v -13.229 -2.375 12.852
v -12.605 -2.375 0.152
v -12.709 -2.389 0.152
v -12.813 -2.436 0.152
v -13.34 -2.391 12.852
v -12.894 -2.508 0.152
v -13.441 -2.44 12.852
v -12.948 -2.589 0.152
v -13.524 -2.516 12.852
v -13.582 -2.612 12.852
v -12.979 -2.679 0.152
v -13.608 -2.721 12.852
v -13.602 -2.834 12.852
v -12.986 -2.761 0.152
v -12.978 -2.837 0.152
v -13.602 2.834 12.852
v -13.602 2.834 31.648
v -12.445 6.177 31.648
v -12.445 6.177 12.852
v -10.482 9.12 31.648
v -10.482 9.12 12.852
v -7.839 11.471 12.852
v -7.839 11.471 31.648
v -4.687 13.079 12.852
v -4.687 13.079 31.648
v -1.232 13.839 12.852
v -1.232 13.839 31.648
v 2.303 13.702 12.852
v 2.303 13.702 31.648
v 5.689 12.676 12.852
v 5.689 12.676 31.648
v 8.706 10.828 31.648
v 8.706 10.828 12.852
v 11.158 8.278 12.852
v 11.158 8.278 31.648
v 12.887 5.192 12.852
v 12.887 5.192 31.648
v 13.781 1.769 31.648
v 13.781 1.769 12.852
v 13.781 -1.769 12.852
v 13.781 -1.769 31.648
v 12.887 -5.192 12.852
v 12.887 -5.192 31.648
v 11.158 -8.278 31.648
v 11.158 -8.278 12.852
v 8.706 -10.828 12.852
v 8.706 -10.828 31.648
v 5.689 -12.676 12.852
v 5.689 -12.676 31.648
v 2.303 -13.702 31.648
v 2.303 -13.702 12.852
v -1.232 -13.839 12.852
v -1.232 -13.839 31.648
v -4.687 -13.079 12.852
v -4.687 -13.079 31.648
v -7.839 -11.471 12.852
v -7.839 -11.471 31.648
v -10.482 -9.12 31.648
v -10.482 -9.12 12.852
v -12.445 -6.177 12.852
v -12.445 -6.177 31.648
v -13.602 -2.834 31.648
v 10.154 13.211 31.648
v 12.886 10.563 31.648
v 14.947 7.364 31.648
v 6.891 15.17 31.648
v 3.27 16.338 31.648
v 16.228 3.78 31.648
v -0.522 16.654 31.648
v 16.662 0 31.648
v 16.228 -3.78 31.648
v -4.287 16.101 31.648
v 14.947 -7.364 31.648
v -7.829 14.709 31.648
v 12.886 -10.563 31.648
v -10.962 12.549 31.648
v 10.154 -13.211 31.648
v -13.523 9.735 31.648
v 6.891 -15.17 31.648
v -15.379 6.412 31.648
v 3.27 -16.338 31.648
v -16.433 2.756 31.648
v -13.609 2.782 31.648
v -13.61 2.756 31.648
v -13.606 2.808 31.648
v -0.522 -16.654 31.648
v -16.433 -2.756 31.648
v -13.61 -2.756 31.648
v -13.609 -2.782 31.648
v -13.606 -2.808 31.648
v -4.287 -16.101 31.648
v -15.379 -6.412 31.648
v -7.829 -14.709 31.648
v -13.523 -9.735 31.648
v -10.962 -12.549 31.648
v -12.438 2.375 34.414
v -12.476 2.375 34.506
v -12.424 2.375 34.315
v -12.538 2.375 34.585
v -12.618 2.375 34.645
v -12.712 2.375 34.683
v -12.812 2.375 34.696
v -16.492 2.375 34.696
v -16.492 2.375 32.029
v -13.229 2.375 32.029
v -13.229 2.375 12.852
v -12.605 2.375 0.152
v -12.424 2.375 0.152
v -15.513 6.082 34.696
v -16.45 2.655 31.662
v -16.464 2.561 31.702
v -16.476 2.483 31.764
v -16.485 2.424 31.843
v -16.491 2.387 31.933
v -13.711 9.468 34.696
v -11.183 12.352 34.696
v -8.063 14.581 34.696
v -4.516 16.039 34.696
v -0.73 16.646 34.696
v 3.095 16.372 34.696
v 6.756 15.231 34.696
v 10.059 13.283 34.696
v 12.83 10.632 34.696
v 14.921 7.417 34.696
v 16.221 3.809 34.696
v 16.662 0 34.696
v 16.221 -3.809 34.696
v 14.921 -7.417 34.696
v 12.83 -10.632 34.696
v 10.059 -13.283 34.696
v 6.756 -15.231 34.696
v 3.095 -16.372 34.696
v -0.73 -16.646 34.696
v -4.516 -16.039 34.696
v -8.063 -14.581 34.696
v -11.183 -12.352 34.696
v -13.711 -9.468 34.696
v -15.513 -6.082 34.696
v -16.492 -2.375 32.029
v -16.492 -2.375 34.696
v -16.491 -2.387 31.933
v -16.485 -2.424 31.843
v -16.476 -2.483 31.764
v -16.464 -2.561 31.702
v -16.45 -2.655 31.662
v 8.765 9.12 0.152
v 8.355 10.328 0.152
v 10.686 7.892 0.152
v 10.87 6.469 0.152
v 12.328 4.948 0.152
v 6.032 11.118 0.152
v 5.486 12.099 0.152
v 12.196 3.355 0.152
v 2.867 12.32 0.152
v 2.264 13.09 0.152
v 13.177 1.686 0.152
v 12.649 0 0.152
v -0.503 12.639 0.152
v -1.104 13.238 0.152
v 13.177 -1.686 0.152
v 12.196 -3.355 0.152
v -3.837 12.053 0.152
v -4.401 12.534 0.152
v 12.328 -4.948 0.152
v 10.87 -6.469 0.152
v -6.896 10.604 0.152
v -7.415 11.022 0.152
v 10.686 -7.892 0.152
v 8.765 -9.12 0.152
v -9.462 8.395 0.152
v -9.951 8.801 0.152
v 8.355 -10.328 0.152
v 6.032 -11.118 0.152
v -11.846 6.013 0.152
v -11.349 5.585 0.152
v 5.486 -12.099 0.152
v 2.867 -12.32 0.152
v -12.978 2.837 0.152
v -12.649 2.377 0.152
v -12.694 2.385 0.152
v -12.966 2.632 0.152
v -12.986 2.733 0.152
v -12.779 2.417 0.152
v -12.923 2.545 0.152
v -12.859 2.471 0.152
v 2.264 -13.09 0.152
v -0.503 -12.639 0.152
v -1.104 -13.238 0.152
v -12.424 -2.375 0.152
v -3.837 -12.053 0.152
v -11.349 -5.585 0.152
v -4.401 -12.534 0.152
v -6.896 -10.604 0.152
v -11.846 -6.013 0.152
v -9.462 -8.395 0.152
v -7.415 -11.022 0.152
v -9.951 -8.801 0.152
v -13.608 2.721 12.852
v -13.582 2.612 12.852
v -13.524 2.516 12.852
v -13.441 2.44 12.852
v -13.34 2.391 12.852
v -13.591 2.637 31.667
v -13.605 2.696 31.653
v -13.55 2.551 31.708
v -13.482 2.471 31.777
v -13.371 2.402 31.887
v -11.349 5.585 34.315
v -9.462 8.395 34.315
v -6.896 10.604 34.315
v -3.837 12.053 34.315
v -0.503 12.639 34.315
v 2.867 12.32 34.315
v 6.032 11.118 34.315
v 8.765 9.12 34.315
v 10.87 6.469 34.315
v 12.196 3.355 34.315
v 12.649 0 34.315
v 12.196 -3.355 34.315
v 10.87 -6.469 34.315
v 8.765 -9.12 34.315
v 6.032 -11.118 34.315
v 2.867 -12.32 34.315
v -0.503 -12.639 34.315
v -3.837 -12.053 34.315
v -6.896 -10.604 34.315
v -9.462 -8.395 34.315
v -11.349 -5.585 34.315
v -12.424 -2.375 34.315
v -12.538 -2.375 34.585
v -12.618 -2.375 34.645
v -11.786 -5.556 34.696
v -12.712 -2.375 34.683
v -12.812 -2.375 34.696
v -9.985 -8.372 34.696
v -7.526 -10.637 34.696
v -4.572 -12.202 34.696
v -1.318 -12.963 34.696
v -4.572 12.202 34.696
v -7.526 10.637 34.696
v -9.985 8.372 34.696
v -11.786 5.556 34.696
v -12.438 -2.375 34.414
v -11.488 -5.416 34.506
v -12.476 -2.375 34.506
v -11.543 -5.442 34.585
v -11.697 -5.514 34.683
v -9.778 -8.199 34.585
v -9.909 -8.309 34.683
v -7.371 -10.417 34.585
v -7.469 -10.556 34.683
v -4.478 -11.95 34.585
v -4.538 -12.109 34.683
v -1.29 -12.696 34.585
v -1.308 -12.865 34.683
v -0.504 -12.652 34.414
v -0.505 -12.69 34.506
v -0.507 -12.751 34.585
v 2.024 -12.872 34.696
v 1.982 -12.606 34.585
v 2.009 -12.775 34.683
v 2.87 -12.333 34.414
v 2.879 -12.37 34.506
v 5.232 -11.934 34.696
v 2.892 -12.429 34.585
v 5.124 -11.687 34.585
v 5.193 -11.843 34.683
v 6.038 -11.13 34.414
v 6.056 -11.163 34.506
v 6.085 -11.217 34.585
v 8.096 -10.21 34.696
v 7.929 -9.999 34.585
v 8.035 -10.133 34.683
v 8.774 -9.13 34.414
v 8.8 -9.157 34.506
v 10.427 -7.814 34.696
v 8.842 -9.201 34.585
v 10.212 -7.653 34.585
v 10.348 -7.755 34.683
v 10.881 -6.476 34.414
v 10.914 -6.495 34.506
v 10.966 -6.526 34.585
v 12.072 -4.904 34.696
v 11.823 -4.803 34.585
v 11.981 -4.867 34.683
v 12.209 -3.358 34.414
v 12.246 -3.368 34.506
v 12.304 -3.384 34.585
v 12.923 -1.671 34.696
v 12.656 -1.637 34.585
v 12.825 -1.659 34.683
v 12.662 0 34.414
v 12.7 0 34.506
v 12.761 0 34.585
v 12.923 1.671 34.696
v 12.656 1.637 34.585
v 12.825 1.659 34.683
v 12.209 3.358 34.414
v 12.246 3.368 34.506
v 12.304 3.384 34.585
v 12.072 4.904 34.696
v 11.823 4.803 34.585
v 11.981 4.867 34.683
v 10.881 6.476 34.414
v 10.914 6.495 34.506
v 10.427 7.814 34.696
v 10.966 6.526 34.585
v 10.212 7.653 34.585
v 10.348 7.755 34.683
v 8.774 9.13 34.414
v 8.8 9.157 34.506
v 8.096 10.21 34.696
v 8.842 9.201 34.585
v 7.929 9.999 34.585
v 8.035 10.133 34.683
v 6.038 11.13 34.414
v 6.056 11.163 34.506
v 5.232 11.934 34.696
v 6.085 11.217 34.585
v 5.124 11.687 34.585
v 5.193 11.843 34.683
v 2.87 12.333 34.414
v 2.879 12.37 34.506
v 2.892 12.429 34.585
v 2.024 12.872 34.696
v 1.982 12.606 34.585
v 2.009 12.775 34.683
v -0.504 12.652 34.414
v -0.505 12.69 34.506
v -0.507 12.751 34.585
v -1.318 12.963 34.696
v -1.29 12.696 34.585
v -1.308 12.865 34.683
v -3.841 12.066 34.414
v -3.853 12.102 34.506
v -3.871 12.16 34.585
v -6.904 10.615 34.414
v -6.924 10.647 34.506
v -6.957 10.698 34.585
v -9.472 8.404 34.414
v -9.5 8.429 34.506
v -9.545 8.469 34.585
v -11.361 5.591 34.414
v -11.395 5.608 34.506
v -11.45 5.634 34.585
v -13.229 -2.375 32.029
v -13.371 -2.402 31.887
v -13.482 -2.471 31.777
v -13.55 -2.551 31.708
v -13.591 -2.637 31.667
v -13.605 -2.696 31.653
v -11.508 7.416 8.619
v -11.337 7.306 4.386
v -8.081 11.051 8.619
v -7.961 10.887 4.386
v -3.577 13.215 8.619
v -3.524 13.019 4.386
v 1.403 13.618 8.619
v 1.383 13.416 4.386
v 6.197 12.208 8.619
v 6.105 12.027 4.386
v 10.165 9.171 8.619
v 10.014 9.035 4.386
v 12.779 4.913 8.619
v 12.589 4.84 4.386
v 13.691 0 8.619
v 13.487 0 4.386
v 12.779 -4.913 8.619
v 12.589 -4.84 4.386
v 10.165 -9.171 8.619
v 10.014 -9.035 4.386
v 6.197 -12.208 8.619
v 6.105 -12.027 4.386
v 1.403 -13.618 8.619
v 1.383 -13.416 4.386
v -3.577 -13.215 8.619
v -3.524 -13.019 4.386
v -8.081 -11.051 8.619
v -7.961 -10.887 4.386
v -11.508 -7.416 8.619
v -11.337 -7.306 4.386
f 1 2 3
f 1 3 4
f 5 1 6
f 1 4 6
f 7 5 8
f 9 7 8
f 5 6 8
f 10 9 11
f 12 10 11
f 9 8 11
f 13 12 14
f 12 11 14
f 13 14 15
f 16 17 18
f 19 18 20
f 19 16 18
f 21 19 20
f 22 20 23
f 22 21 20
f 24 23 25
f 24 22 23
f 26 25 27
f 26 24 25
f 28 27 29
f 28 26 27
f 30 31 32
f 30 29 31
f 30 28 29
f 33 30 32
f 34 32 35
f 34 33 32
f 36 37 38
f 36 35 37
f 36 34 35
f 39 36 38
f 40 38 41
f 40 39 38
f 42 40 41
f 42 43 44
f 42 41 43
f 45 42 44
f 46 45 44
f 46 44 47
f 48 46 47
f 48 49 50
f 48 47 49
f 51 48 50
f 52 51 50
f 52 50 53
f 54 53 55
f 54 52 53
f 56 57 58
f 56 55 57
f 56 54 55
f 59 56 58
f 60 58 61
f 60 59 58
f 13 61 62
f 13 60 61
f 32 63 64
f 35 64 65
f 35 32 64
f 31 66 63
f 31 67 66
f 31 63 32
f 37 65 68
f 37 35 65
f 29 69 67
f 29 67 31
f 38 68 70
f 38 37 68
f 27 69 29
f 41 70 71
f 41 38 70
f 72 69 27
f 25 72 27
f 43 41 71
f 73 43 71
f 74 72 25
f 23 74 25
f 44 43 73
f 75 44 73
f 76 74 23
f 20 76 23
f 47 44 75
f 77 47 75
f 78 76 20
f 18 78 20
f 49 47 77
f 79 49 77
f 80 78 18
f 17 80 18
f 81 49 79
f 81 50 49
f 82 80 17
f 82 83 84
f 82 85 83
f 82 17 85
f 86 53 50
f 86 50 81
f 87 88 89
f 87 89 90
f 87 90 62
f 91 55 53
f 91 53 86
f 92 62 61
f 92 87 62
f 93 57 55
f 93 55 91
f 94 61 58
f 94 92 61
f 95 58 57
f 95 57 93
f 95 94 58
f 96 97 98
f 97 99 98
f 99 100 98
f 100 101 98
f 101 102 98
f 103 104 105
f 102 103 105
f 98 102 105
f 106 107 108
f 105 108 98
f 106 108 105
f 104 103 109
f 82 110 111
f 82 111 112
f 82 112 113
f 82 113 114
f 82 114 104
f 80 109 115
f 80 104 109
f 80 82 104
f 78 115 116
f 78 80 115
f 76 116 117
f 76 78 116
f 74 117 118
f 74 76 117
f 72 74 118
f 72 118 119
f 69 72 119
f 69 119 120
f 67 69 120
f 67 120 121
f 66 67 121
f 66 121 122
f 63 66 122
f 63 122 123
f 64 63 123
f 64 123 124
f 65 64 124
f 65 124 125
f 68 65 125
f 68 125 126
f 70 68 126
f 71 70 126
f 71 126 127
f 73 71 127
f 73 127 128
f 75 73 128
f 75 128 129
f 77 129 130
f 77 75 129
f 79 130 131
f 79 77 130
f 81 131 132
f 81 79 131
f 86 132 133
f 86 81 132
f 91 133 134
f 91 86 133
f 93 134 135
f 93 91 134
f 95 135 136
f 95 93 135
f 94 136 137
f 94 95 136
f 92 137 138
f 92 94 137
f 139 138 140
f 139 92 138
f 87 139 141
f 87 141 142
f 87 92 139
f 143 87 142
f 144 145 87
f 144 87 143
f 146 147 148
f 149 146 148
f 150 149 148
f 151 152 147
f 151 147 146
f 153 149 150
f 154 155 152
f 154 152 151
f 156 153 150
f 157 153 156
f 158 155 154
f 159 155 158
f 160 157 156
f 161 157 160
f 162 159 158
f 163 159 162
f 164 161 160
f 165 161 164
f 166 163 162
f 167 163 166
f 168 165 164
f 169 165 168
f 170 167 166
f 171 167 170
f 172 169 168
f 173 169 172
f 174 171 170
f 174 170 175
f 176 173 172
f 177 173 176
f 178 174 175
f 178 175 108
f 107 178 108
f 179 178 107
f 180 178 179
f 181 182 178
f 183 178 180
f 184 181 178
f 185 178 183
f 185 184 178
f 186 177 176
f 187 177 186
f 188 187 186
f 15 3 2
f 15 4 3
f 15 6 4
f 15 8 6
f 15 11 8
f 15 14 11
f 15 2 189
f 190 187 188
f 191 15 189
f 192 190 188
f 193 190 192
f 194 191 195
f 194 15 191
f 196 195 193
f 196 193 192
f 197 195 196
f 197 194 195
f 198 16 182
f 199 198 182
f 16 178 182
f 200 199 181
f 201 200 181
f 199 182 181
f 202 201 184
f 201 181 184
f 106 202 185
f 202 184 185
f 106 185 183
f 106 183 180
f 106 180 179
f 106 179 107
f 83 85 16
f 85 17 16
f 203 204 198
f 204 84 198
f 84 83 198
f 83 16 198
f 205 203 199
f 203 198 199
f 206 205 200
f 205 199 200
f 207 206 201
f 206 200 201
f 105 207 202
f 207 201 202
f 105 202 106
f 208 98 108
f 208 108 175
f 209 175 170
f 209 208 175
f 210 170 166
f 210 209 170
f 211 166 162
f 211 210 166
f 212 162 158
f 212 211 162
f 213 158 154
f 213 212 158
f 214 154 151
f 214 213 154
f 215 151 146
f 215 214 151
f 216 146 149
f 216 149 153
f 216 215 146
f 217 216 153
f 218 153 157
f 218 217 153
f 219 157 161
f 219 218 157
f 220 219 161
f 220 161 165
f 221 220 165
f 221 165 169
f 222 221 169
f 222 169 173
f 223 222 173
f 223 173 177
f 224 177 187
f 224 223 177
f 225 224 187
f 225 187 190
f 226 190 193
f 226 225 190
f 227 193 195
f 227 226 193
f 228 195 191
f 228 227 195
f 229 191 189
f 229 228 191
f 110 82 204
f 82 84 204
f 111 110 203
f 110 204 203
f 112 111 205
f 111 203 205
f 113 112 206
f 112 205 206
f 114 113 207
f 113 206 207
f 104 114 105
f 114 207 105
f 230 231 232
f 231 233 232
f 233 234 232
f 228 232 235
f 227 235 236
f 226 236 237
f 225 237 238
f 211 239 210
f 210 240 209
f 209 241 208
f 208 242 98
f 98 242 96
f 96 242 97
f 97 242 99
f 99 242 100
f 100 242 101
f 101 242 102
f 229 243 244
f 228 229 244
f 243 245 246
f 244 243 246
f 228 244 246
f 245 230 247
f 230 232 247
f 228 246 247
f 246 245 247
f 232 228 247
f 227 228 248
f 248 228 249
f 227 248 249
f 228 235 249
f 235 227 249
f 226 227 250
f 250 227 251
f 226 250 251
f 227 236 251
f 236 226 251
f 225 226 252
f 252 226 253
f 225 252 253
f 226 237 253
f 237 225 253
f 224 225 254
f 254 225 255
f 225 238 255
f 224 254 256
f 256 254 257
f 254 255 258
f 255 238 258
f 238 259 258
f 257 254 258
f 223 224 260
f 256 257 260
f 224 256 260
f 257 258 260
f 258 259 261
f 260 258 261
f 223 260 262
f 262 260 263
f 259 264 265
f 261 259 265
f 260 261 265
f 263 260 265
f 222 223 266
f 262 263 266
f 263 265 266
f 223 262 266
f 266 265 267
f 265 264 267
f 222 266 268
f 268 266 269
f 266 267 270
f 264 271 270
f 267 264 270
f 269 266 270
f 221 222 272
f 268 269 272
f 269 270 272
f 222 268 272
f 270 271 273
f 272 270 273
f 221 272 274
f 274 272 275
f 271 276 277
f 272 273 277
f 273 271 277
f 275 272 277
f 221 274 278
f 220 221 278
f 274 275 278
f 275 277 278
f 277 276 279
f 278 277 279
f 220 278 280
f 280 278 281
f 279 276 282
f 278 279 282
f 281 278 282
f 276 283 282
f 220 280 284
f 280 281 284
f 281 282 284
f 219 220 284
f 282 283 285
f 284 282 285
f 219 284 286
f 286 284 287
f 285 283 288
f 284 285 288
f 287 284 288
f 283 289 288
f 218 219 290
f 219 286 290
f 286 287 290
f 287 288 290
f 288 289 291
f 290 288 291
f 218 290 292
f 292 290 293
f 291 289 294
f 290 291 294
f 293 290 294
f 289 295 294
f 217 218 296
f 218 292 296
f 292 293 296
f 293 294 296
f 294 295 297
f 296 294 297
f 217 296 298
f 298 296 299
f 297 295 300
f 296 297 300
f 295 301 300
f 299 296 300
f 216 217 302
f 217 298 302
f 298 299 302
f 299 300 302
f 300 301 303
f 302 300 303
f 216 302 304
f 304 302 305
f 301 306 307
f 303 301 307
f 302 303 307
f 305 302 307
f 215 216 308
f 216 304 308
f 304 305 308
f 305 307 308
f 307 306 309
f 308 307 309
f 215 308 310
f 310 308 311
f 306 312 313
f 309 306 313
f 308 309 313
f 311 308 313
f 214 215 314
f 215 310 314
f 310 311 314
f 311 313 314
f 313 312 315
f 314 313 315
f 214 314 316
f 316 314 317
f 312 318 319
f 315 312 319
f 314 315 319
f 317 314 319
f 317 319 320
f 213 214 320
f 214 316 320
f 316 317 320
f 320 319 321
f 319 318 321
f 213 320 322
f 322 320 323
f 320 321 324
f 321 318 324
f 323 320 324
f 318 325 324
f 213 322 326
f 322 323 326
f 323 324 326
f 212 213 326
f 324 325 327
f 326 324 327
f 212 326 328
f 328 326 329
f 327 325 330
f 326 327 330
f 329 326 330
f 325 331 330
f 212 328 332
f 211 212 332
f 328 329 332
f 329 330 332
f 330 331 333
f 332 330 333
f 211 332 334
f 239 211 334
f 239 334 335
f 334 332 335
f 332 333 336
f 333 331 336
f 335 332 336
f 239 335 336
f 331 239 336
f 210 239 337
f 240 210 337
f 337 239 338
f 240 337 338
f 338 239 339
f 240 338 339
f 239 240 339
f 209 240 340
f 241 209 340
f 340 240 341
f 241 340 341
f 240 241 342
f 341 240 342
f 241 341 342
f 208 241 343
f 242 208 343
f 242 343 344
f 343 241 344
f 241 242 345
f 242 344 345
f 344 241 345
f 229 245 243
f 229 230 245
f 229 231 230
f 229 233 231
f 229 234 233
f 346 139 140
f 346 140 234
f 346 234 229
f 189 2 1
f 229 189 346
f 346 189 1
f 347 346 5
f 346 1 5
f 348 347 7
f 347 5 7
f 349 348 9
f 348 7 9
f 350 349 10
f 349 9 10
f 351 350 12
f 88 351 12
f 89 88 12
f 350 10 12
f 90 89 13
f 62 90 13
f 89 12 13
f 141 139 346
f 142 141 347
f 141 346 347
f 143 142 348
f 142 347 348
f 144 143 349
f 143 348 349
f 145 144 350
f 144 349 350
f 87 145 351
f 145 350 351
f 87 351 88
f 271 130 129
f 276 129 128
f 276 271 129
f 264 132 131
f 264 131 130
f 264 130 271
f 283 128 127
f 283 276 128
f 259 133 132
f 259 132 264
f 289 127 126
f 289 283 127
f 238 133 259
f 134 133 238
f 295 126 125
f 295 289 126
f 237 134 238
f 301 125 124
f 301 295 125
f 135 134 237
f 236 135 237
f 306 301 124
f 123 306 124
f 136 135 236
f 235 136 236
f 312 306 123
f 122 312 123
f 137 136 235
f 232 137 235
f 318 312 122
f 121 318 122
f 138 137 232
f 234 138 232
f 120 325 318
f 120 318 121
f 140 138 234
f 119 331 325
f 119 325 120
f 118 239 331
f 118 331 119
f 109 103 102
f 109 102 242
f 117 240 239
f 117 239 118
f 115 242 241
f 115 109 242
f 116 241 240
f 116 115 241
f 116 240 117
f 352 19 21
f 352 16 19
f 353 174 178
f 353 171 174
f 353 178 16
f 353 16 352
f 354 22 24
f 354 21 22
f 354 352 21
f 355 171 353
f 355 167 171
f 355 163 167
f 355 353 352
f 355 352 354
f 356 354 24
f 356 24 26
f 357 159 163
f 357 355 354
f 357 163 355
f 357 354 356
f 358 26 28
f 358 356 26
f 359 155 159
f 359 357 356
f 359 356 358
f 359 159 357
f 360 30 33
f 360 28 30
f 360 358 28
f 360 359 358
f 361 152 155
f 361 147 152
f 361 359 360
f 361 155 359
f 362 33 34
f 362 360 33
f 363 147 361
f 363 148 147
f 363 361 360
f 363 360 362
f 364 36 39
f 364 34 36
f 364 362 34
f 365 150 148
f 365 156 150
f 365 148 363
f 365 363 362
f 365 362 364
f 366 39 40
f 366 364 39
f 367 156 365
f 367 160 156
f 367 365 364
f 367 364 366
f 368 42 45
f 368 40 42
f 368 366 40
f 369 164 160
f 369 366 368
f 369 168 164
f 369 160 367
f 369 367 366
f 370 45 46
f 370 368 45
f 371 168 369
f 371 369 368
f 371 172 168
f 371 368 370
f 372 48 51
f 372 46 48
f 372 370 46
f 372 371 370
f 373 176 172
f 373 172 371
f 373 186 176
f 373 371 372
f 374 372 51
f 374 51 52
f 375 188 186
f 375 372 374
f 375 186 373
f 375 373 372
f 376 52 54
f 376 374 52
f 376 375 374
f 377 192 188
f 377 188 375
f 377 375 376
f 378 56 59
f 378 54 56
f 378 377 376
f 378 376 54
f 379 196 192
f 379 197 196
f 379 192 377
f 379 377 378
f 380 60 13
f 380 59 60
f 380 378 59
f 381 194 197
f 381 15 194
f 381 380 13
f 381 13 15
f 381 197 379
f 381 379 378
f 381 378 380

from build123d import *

# Parameters (mm, degrees)
F2_W     = 25.146
F2_H     = 4.7498
F3_DEPTH = 34.6974
F4_R     = 0.381


with BuildPart() as f1:
    # F0 (on Right) → F1 (revolve)
    with BuildSketch(Plane.YZ):
        Polygon((-12.6492, 0.1524), (-12.6492, 34.6964), (-16.6624, 34.6964), (-16.6624, 31.6484), (-13.8938, 31.6484), (-13.8938, 12.8524), (-13.2842, 0.1524), align=None)
    revolve(axis=Axis((0, 0, 4.6482), (0, 0, -1)))

    # F2 (on Top) → F3 (cut, through all)
    with BuildSketch(Plane.XY):
        with Locations((-12.827, 0)):
            Rectangle(F2_W, F2_H)
    extrude(amount=F3_DEPTH, mode=Mode.SUBTRACT)

    # F4
    f4_edges = [f1.edges().sort_by_distance(p)[0] for p in [
        (-13.379864, -2.3749, 6.502395),
        (-13.689322, -2.3749, 22.2504),
        (-13.379864, 2.3749, 6.502395),
        (-13.689322, 2.3749, 22.2504),
        (-15.090803, -2.3749, 31.6484),
        (-15.090803, 2.3749, 31.6484),
        (12.6492, 0, 34.6964),
        (13.8938, 0, 12.8524),
    ]]
    fillet(f4_edges, radius=F4_R)


solid = f1.part
